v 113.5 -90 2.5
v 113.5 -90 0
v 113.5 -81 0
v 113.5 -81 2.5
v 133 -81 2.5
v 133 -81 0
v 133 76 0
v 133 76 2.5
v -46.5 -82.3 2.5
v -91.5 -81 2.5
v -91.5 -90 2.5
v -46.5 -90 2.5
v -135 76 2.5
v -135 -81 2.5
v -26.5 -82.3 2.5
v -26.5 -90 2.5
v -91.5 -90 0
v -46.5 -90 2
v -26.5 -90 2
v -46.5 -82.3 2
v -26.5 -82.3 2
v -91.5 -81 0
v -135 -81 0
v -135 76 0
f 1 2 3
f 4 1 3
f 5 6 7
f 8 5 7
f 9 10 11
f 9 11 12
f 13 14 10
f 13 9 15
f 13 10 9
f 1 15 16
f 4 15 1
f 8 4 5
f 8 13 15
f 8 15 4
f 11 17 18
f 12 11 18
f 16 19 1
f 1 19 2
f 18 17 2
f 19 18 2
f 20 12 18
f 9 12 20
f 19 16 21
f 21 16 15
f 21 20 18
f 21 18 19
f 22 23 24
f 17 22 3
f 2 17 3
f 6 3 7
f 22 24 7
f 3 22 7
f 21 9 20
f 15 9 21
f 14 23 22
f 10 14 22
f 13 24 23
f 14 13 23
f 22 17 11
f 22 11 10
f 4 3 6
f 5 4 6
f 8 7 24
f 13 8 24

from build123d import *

# Parameters (mm, degrees)
F0_W     = 257
F0_H     = 145
F0_W_2   = 205
F0_H_2   = 9
F1_DEPTH = 2.5
F2_W     = 20
F2_H     = 7.7
F3_DEPTH = 0.5


with BuildPart() as f1:
    # F0 (on Top) → F1 (new body)
    with BuildSketch(Plane.XY):
        Polygon((133, 76), (-135, 76), (-135, -81), (-91.5, -81), (113.5, -81), (133, -81), align=None)
        Rectangle(F0_W, F0_H, mode=Mode.SUBTRACT)
        Rectangle(F0_W, F0_H)
        with Locations((11, -85.5)):
            Rectangle(F0_W_2, F0_H_2)
    extrude(amount=F1_DEPTH)

    # F2 (on face) → F3 (cut)
    with BuildSketch(Plane.XY.offset(2.5)):
        with Locations((-36.5, -86.15)):
            Rectangle(F2_W, F2_H)
    extrude(amount=-F3_DEPTH, mode=Mode.SUBTRACT)


solid = f1.part
